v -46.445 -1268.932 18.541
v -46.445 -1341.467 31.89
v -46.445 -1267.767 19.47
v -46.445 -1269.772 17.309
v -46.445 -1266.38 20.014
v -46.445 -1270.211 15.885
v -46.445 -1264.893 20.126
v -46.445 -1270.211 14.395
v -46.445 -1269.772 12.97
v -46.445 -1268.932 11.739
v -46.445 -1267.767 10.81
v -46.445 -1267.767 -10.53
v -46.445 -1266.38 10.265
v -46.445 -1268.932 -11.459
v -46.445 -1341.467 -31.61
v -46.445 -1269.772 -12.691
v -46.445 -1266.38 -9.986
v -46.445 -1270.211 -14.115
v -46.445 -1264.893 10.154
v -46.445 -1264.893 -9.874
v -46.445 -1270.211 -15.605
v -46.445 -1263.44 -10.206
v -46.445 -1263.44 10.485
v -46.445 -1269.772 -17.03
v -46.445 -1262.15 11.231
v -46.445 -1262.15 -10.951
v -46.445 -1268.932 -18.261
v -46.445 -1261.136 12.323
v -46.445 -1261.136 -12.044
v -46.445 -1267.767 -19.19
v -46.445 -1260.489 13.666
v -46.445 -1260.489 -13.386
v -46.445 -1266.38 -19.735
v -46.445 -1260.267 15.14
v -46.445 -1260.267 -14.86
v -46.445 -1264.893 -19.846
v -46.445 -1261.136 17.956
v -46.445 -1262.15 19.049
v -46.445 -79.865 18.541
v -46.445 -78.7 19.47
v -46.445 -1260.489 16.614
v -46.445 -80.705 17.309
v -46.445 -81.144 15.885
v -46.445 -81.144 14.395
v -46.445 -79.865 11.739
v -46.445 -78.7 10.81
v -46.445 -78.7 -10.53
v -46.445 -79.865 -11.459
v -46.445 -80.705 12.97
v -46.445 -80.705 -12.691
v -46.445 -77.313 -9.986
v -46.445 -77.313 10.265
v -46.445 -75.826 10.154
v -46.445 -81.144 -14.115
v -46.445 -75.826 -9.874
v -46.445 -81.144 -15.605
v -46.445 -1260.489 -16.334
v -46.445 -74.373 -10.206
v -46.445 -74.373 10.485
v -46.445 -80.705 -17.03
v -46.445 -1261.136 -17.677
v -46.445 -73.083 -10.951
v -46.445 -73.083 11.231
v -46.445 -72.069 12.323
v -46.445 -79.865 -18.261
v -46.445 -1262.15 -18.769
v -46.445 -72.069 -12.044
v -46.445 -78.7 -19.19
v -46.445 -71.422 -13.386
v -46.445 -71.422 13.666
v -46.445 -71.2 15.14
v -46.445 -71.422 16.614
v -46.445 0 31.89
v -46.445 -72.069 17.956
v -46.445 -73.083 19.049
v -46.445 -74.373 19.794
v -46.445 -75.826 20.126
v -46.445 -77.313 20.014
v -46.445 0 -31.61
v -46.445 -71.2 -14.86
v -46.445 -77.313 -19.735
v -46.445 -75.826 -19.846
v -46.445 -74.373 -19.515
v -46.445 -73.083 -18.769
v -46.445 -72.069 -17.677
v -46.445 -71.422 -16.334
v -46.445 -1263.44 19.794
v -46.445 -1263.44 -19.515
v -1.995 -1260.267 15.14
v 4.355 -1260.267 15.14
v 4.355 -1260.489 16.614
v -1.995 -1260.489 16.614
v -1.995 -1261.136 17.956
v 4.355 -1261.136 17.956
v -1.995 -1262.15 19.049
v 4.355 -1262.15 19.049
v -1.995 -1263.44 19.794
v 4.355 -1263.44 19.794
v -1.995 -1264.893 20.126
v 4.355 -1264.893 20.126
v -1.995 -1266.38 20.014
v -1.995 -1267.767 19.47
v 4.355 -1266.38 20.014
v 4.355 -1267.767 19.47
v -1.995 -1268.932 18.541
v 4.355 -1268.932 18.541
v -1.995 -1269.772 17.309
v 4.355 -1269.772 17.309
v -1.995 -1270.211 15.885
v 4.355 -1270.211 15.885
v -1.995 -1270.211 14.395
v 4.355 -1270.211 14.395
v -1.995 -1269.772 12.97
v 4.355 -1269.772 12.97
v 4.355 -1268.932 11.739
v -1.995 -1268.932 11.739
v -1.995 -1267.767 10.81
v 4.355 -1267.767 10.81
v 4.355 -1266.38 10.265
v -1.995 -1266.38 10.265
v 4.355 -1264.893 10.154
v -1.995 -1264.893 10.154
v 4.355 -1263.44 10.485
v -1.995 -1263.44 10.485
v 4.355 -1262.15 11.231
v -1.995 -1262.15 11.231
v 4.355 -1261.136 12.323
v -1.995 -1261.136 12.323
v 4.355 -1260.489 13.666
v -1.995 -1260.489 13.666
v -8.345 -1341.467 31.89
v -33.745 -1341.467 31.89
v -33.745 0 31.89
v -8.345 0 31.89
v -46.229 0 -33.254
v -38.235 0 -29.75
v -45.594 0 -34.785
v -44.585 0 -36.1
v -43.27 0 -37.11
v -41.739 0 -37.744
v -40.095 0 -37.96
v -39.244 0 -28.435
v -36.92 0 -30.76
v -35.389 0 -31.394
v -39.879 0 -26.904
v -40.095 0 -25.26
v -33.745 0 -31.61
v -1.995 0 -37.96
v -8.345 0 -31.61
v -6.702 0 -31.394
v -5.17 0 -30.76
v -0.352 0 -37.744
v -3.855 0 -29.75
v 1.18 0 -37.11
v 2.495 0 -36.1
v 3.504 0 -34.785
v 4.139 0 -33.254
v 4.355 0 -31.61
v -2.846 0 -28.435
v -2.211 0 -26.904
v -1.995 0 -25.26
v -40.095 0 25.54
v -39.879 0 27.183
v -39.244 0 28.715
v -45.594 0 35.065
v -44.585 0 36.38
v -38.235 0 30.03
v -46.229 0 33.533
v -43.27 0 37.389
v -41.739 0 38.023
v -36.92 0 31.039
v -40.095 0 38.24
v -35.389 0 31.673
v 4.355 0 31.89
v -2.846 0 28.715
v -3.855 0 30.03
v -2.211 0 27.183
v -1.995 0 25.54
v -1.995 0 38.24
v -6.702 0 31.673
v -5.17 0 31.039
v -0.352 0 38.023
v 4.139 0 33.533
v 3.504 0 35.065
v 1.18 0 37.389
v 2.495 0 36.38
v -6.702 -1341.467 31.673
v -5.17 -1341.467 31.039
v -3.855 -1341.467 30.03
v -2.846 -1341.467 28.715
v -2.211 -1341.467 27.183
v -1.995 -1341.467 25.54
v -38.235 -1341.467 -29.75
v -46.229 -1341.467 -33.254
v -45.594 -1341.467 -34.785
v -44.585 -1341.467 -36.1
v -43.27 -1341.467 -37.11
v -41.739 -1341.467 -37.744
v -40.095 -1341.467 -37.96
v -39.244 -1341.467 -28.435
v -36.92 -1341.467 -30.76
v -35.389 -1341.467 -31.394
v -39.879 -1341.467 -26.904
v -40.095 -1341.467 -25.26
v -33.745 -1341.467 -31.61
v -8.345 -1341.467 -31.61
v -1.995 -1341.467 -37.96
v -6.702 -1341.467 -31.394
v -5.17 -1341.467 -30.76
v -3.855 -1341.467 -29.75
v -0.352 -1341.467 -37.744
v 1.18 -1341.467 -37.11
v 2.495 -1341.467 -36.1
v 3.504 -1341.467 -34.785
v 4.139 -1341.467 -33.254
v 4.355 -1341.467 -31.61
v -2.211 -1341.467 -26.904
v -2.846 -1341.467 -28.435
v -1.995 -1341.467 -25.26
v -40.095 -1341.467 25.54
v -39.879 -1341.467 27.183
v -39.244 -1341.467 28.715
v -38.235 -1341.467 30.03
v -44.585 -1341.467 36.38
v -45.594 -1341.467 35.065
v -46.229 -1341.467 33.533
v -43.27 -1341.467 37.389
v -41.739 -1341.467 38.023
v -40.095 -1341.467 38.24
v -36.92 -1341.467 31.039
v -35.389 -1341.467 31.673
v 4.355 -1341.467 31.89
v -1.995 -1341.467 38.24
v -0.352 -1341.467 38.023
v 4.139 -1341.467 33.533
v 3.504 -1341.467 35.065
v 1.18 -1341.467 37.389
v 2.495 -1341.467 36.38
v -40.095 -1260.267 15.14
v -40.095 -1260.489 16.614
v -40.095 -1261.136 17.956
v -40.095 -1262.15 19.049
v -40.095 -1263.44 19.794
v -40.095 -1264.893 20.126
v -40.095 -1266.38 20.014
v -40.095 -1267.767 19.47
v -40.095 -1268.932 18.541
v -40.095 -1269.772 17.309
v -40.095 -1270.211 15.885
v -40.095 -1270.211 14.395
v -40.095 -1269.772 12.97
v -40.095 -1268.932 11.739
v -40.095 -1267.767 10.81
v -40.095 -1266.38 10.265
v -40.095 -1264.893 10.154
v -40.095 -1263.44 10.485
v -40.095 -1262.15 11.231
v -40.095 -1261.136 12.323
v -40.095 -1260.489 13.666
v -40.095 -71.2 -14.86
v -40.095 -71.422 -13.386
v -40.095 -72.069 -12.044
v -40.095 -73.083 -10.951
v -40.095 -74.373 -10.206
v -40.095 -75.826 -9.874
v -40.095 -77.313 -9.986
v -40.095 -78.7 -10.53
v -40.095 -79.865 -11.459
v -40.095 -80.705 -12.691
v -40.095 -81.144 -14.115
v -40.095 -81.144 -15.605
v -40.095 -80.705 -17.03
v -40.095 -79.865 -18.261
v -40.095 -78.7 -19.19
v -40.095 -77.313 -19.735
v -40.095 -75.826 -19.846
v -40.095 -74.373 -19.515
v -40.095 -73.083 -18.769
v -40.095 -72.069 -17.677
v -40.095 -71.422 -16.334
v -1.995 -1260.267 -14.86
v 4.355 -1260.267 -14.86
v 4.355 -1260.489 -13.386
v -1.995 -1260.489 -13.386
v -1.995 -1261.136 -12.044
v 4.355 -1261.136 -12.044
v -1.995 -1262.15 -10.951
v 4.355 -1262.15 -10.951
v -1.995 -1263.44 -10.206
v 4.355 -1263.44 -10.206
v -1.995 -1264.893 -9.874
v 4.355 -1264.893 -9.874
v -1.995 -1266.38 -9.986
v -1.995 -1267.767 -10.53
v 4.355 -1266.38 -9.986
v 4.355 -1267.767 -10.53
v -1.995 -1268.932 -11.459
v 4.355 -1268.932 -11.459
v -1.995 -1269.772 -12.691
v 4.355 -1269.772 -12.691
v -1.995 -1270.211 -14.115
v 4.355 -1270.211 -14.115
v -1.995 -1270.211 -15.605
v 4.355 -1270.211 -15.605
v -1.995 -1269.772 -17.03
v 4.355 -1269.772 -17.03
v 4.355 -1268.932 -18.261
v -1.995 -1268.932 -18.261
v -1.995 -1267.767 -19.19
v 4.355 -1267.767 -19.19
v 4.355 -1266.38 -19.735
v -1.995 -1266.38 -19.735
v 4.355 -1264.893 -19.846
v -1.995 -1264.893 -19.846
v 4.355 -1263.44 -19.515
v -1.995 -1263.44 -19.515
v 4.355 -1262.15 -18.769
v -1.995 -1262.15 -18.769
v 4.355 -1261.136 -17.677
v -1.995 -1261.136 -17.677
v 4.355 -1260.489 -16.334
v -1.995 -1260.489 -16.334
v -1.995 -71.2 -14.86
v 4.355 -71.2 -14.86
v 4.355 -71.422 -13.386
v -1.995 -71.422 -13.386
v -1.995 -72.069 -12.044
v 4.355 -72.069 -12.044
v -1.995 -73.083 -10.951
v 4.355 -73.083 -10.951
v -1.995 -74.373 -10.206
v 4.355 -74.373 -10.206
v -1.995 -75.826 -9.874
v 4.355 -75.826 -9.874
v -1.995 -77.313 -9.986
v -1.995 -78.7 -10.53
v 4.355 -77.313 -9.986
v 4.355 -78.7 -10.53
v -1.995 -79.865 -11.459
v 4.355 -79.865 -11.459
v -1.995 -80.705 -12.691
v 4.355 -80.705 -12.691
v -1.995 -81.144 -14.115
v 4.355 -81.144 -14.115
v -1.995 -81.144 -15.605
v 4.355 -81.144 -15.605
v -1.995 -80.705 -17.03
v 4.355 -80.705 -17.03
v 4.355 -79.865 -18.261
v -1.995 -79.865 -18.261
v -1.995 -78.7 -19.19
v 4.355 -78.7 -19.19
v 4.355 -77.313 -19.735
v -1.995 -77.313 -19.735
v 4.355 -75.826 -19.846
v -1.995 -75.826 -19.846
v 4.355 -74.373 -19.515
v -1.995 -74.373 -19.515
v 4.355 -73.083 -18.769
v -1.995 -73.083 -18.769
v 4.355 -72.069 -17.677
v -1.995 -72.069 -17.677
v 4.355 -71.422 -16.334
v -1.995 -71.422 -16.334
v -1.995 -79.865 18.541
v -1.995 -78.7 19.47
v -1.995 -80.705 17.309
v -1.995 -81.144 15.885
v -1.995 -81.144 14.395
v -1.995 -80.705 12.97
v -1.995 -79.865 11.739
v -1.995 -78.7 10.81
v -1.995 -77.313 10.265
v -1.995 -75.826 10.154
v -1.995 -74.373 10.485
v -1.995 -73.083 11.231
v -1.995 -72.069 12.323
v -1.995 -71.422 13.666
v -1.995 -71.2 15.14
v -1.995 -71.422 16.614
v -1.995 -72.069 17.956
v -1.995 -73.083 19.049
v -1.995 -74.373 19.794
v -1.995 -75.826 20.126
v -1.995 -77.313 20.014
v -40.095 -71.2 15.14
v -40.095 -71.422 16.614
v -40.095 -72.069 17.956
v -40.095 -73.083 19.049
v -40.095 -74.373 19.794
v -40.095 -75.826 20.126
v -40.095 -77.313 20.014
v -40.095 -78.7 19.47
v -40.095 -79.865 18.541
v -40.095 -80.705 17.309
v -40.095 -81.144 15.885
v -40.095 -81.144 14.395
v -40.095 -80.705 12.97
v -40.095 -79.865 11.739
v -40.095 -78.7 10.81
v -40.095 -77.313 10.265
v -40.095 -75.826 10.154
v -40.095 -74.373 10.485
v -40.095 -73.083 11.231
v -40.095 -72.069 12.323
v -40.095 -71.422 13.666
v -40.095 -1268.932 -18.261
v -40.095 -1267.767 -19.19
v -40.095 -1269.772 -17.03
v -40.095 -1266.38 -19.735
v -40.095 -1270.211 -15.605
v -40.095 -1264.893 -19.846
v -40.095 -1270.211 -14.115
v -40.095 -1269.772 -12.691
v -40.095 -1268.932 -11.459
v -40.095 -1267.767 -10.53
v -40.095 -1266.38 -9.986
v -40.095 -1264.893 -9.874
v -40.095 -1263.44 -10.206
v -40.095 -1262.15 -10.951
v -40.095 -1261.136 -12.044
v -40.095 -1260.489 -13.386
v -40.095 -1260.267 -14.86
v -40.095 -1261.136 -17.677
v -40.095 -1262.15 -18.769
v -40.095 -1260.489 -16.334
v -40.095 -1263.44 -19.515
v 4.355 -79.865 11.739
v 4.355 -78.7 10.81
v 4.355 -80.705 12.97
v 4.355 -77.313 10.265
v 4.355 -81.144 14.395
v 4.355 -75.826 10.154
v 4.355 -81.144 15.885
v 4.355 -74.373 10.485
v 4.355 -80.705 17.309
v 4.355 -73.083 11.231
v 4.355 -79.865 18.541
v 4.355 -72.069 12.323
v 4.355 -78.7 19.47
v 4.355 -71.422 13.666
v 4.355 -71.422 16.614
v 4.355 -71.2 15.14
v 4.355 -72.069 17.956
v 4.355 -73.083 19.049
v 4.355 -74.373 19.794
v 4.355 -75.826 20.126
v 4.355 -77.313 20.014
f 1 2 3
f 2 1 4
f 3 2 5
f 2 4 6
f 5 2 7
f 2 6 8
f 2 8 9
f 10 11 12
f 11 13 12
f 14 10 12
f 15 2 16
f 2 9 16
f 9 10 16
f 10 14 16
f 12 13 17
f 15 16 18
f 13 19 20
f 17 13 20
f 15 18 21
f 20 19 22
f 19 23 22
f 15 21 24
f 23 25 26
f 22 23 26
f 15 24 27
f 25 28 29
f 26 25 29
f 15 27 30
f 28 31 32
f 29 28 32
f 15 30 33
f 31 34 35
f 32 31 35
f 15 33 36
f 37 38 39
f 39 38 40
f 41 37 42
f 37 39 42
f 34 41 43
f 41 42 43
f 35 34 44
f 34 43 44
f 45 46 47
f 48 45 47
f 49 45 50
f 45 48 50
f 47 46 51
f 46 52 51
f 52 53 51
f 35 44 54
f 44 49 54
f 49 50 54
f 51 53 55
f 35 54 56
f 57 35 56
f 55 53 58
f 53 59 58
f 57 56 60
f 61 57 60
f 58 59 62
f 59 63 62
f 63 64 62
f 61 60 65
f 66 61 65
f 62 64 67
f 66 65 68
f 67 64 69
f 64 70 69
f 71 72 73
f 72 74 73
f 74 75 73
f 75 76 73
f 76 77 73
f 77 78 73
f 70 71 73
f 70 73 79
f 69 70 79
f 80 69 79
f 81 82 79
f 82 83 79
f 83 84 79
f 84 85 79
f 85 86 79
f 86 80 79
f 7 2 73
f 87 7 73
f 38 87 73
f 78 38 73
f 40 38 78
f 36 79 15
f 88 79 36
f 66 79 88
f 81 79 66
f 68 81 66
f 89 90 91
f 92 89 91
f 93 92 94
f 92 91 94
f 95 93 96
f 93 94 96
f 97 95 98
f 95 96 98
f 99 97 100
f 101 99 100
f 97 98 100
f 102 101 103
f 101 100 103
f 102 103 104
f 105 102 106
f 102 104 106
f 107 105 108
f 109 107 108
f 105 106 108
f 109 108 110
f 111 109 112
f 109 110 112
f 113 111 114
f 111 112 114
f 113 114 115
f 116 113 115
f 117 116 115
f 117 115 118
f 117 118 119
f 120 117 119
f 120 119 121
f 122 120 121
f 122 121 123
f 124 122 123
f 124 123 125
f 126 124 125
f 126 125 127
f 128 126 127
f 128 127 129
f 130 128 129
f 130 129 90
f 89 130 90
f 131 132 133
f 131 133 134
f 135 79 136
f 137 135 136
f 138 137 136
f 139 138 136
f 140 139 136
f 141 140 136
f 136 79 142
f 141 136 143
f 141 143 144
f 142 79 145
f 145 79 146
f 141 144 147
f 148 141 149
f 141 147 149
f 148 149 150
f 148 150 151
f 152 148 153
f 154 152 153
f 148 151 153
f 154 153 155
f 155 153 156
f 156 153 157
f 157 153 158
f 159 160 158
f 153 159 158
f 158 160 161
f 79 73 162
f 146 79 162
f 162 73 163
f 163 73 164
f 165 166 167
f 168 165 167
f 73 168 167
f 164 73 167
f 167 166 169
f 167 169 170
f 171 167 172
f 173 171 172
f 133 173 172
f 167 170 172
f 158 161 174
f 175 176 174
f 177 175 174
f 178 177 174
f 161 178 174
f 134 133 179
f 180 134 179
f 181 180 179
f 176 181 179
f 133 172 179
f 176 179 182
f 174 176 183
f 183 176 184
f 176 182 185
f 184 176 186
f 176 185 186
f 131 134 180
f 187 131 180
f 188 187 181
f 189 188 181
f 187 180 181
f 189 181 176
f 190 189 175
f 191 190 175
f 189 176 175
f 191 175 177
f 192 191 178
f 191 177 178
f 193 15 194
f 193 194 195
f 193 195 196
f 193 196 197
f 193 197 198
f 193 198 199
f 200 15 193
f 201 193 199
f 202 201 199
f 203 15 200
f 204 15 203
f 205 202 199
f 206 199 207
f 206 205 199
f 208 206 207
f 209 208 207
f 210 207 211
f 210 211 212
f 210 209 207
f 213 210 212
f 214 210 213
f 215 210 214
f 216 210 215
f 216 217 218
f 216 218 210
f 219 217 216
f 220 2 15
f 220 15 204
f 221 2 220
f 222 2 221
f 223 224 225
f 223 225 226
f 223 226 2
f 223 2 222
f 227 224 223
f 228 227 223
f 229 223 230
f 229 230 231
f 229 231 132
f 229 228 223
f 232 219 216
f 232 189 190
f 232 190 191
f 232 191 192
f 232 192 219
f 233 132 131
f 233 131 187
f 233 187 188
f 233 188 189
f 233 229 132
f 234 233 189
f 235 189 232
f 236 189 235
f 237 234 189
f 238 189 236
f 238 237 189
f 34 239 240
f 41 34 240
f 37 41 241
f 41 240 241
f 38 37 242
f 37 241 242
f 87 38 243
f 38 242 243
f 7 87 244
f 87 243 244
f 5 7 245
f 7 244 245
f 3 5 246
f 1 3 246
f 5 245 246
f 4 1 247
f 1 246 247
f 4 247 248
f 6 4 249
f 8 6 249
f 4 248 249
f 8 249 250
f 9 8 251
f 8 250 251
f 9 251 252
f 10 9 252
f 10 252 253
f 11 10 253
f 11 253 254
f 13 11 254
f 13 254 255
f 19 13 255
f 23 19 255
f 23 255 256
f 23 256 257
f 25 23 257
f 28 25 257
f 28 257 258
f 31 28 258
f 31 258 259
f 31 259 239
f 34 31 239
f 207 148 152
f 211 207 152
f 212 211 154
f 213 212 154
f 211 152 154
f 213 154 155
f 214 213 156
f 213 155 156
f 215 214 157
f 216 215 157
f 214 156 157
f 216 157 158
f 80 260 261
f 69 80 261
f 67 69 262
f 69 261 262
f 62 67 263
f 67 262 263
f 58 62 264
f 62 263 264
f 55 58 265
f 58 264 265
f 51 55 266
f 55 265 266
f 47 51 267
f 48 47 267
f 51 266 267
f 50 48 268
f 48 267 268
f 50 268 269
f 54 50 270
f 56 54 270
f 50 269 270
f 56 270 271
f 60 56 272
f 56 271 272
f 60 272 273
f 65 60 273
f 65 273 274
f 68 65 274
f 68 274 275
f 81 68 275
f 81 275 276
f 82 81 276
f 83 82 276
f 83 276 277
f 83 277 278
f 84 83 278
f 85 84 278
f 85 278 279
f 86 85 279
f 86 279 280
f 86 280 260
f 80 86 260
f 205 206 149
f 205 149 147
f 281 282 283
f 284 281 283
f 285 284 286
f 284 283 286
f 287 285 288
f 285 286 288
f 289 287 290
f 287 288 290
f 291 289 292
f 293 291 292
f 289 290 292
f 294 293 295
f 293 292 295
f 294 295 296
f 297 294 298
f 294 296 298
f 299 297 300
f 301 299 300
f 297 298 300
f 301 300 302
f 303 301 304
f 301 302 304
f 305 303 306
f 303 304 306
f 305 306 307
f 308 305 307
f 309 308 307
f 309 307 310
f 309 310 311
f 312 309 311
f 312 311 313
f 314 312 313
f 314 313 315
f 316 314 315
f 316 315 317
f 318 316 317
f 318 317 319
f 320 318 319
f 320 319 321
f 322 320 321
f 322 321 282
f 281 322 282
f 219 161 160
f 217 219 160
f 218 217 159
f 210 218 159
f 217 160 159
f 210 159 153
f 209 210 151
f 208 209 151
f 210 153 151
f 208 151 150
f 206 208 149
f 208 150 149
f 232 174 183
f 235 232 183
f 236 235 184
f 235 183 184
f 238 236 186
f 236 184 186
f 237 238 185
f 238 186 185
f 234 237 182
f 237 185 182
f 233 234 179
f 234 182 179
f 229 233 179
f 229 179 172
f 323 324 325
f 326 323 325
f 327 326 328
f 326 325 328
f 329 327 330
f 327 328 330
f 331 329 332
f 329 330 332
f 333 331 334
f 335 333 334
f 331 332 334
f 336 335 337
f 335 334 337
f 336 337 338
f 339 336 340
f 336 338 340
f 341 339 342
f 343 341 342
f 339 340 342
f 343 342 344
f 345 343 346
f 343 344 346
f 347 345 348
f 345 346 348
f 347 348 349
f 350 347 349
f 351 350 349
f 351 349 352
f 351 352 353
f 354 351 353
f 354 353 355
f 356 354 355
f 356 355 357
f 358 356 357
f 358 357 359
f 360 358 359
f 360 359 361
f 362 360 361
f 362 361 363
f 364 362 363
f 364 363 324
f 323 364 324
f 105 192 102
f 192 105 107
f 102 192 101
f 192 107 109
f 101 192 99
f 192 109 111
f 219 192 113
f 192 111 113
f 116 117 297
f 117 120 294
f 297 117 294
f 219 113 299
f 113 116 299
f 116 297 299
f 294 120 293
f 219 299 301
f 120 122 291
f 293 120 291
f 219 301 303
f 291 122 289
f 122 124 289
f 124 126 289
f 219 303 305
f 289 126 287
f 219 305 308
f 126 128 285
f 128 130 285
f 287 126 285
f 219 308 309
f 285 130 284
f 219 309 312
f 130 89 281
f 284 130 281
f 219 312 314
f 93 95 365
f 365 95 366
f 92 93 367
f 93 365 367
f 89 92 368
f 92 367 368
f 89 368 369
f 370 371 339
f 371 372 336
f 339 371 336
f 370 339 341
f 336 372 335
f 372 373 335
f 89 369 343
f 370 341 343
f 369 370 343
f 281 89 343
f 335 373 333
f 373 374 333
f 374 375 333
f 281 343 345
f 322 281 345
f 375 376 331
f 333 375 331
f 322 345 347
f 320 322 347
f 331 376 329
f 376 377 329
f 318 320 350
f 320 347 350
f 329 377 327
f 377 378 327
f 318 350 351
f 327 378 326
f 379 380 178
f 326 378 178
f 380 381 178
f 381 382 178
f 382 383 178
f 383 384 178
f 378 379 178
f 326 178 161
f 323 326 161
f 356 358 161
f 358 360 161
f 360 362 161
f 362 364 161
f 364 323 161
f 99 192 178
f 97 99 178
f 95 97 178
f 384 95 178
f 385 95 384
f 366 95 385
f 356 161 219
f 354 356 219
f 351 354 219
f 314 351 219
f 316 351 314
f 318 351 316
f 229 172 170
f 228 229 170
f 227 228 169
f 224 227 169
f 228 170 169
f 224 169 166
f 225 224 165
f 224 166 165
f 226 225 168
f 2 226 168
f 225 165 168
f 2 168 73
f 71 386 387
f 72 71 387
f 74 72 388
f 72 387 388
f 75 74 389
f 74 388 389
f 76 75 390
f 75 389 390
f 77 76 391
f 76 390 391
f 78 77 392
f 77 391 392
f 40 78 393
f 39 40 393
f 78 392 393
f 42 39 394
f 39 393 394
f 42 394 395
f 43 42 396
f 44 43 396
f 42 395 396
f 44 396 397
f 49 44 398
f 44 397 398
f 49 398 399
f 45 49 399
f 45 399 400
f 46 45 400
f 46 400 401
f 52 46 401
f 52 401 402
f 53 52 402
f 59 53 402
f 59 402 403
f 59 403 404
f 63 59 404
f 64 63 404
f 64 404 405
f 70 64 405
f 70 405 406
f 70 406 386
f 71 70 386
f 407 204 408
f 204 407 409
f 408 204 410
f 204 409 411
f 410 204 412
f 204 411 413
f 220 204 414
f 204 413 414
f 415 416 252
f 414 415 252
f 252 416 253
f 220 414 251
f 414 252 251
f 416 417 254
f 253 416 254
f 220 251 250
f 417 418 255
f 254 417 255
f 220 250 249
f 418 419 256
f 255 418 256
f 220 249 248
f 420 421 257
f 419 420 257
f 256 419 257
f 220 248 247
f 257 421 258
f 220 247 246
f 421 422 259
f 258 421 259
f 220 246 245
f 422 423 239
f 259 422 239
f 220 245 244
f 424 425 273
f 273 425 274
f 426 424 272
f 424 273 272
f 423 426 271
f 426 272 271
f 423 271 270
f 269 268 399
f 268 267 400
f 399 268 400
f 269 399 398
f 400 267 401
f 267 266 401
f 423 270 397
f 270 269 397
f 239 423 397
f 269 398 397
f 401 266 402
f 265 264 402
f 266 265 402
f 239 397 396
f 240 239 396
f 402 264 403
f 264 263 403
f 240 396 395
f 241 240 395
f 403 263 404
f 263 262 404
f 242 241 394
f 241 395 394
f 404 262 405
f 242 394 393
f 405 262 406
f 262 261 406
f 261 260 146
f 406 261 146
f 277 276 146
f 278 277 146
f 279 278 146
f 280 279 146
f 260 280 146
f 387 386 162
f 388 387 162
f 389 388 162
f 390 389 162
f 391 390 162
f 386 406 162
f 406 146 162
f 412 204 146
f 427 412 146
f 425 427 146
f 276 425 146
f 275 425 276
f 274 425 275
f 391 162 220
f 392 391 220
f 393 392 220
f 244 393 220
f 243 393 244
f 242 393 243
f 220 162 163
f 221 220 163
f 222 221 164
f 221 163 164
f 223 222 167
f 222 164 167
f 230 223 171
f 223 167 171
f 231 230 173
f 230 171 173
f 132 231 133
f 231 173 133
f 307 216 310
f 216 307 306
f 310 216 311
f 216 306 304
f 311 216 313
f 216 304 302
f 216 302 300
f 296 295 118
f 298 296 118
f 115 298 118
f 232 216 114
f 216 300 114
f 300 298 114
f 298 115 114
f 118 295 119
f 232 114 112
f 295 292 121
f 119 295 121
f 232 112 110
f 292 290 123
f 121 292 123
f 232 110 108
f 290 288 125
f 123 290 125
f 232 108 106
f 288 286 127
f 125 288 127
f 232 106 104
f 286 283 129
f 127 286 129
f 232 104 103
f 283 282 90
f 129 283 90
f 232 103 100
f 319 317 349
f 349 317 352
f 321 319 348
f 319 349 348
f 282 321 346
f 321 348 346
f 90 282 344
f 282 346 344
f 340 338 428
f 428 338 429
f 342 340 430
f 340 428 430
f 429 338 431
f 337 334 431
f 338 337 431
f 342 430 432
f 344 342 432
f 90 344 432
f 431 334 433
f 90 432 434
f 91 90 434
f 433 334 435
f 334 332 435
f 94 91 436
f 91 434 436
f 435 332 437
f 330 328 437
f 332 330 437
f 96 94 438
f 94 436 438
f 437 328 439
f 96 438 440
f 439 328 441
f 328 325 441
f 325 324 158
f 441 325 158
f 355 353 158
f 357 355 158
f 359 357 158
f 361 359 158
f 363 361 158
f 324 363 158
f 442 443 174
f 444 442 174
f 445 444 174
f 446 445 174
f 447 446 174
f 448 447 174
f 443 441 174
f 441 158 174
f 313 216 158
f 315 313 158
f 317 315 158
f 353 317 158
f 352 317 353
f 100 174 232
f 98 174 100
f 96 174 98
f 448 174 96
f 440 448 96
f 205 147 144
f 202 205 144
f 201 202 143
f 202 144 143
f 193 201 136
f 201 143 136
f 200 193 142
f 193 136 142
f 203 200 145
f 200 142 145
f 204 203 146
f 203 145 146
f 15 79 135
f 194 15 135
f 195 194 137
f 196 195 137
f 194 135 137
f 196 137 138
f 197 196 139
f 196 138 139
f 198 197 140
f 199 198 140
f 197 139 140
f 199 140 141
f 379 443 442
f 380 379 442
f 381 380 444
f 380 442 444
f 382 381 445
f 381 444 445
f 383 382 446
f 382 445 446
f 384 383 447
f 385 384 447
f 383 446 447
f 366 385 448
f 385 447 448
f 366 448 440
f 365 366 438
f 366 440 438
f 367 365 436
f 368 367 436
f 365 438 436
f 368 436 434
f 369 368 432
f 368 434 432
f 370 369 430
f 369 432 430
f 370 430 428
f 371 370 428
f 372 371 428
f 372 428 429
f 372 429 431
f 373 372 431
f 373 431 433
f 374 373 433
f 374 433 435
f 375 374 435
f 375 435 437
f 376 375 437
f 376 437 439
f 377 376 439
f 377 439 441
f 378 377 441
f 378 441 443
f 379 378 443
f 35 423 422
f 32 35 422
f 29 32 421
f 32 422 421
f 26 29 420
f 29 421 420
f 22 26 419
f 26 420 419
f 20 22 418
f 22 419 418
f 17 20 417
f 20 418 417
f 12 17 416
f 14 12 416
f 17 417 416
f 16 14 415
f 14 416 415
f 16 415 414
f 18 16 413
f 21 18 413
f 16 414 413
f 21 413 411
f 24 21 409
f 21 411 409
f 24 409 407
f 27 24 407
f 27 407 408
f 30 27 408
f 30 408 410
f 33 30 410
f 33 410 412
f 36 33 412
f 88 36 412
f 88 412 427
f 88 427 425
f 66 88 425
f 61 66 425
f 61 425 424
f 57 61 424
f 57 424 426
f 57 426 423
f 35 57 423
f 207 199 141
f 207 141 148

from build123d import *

# Parameters (mm, degrees)
F1_DEPTH = 1341.467
F2_R     = 5
F3_DEPTH = 50.801


with BuildPart() as f1:
    # F0 (on Front) → F1 (new body)
    with BuildSketch(Plane.XZ):
        with BuildLine():
            Line((-1.995114, 38.239733), (-40.095114, 38.239733))
            ThreePointArc((-40.095114, 38.239733), (-44.585242, 36.379861), (-46.445114, 31.889733))
            Line((-46.445114, 31.889733), (-46.445114, -31.610267))
            ThreePointArc((-46.445114, -31.610267), (-44.585242, -36.100395), (-40.095114, -37.960267))
            Line((-40.095114, -37.960267), (-1.995114, -37.960267))
            ThreePointArc((-1.995114, -37.960267), (2.495014, -36.100395), (4.354886, -31.610267))
            Line((4.354886, -31.610267), (4.354886, 31.889733))
            ThreePointArc((4.354886, 31.889733), (2.495014, 36.379861), (-1.995114, 38.239733))
        make_face()
        with BuildLine():
            ThreePointArc((-40.095114, 25.539733), (-38.235242, 30.029861), (-33.745114, 31.889733))
            Line((-33.745114, 31.889733), (-8.345114, 31.889733))
            ThreePointArc((-8.345114, 31.889733), (-3.854986, 30.029861), (-1.995114, 25.539733))
            Line((-1.995114, 25.539733), (-1.995114, -25.260267))
            ThreePointArc((-1.995114, -25.260267), (-3.854986, -29.750395), (-8.345114, -31.610267))
            Line((-8.345114, -31.610267), (-33.745114, -31.610267))
            ThreePointArc((-33.745114, -31.610267), (-38.235242, -29.750395), (-40.095114, -25.260267))
            Line((-40.095114, -25.260267), (-40.095114, 25.539733))
        make_face(mode=Mode.SUBTRACT)
    extrude(amount=F1_DEPTH)

    # F2 (on face) → F3 (cut, through all)
    with BuildSketch(Plane.YZ.offset(4.354886)):
        with Locations((-76.2, 15.139733)):
            Circle(F2_R)
        with Locations((-76.2, -14.860267)):
            Circle(F2_R)
        with Locations((-1265.267, -14.860267)):
            Circle(F2_R)
        with Locations((-1265.267, 15.139733)):
            Circle(F2_R)
    extrude(amount=-F3_DEPTH, mode=Mode.SUBTRACT)


solid = f1.part
